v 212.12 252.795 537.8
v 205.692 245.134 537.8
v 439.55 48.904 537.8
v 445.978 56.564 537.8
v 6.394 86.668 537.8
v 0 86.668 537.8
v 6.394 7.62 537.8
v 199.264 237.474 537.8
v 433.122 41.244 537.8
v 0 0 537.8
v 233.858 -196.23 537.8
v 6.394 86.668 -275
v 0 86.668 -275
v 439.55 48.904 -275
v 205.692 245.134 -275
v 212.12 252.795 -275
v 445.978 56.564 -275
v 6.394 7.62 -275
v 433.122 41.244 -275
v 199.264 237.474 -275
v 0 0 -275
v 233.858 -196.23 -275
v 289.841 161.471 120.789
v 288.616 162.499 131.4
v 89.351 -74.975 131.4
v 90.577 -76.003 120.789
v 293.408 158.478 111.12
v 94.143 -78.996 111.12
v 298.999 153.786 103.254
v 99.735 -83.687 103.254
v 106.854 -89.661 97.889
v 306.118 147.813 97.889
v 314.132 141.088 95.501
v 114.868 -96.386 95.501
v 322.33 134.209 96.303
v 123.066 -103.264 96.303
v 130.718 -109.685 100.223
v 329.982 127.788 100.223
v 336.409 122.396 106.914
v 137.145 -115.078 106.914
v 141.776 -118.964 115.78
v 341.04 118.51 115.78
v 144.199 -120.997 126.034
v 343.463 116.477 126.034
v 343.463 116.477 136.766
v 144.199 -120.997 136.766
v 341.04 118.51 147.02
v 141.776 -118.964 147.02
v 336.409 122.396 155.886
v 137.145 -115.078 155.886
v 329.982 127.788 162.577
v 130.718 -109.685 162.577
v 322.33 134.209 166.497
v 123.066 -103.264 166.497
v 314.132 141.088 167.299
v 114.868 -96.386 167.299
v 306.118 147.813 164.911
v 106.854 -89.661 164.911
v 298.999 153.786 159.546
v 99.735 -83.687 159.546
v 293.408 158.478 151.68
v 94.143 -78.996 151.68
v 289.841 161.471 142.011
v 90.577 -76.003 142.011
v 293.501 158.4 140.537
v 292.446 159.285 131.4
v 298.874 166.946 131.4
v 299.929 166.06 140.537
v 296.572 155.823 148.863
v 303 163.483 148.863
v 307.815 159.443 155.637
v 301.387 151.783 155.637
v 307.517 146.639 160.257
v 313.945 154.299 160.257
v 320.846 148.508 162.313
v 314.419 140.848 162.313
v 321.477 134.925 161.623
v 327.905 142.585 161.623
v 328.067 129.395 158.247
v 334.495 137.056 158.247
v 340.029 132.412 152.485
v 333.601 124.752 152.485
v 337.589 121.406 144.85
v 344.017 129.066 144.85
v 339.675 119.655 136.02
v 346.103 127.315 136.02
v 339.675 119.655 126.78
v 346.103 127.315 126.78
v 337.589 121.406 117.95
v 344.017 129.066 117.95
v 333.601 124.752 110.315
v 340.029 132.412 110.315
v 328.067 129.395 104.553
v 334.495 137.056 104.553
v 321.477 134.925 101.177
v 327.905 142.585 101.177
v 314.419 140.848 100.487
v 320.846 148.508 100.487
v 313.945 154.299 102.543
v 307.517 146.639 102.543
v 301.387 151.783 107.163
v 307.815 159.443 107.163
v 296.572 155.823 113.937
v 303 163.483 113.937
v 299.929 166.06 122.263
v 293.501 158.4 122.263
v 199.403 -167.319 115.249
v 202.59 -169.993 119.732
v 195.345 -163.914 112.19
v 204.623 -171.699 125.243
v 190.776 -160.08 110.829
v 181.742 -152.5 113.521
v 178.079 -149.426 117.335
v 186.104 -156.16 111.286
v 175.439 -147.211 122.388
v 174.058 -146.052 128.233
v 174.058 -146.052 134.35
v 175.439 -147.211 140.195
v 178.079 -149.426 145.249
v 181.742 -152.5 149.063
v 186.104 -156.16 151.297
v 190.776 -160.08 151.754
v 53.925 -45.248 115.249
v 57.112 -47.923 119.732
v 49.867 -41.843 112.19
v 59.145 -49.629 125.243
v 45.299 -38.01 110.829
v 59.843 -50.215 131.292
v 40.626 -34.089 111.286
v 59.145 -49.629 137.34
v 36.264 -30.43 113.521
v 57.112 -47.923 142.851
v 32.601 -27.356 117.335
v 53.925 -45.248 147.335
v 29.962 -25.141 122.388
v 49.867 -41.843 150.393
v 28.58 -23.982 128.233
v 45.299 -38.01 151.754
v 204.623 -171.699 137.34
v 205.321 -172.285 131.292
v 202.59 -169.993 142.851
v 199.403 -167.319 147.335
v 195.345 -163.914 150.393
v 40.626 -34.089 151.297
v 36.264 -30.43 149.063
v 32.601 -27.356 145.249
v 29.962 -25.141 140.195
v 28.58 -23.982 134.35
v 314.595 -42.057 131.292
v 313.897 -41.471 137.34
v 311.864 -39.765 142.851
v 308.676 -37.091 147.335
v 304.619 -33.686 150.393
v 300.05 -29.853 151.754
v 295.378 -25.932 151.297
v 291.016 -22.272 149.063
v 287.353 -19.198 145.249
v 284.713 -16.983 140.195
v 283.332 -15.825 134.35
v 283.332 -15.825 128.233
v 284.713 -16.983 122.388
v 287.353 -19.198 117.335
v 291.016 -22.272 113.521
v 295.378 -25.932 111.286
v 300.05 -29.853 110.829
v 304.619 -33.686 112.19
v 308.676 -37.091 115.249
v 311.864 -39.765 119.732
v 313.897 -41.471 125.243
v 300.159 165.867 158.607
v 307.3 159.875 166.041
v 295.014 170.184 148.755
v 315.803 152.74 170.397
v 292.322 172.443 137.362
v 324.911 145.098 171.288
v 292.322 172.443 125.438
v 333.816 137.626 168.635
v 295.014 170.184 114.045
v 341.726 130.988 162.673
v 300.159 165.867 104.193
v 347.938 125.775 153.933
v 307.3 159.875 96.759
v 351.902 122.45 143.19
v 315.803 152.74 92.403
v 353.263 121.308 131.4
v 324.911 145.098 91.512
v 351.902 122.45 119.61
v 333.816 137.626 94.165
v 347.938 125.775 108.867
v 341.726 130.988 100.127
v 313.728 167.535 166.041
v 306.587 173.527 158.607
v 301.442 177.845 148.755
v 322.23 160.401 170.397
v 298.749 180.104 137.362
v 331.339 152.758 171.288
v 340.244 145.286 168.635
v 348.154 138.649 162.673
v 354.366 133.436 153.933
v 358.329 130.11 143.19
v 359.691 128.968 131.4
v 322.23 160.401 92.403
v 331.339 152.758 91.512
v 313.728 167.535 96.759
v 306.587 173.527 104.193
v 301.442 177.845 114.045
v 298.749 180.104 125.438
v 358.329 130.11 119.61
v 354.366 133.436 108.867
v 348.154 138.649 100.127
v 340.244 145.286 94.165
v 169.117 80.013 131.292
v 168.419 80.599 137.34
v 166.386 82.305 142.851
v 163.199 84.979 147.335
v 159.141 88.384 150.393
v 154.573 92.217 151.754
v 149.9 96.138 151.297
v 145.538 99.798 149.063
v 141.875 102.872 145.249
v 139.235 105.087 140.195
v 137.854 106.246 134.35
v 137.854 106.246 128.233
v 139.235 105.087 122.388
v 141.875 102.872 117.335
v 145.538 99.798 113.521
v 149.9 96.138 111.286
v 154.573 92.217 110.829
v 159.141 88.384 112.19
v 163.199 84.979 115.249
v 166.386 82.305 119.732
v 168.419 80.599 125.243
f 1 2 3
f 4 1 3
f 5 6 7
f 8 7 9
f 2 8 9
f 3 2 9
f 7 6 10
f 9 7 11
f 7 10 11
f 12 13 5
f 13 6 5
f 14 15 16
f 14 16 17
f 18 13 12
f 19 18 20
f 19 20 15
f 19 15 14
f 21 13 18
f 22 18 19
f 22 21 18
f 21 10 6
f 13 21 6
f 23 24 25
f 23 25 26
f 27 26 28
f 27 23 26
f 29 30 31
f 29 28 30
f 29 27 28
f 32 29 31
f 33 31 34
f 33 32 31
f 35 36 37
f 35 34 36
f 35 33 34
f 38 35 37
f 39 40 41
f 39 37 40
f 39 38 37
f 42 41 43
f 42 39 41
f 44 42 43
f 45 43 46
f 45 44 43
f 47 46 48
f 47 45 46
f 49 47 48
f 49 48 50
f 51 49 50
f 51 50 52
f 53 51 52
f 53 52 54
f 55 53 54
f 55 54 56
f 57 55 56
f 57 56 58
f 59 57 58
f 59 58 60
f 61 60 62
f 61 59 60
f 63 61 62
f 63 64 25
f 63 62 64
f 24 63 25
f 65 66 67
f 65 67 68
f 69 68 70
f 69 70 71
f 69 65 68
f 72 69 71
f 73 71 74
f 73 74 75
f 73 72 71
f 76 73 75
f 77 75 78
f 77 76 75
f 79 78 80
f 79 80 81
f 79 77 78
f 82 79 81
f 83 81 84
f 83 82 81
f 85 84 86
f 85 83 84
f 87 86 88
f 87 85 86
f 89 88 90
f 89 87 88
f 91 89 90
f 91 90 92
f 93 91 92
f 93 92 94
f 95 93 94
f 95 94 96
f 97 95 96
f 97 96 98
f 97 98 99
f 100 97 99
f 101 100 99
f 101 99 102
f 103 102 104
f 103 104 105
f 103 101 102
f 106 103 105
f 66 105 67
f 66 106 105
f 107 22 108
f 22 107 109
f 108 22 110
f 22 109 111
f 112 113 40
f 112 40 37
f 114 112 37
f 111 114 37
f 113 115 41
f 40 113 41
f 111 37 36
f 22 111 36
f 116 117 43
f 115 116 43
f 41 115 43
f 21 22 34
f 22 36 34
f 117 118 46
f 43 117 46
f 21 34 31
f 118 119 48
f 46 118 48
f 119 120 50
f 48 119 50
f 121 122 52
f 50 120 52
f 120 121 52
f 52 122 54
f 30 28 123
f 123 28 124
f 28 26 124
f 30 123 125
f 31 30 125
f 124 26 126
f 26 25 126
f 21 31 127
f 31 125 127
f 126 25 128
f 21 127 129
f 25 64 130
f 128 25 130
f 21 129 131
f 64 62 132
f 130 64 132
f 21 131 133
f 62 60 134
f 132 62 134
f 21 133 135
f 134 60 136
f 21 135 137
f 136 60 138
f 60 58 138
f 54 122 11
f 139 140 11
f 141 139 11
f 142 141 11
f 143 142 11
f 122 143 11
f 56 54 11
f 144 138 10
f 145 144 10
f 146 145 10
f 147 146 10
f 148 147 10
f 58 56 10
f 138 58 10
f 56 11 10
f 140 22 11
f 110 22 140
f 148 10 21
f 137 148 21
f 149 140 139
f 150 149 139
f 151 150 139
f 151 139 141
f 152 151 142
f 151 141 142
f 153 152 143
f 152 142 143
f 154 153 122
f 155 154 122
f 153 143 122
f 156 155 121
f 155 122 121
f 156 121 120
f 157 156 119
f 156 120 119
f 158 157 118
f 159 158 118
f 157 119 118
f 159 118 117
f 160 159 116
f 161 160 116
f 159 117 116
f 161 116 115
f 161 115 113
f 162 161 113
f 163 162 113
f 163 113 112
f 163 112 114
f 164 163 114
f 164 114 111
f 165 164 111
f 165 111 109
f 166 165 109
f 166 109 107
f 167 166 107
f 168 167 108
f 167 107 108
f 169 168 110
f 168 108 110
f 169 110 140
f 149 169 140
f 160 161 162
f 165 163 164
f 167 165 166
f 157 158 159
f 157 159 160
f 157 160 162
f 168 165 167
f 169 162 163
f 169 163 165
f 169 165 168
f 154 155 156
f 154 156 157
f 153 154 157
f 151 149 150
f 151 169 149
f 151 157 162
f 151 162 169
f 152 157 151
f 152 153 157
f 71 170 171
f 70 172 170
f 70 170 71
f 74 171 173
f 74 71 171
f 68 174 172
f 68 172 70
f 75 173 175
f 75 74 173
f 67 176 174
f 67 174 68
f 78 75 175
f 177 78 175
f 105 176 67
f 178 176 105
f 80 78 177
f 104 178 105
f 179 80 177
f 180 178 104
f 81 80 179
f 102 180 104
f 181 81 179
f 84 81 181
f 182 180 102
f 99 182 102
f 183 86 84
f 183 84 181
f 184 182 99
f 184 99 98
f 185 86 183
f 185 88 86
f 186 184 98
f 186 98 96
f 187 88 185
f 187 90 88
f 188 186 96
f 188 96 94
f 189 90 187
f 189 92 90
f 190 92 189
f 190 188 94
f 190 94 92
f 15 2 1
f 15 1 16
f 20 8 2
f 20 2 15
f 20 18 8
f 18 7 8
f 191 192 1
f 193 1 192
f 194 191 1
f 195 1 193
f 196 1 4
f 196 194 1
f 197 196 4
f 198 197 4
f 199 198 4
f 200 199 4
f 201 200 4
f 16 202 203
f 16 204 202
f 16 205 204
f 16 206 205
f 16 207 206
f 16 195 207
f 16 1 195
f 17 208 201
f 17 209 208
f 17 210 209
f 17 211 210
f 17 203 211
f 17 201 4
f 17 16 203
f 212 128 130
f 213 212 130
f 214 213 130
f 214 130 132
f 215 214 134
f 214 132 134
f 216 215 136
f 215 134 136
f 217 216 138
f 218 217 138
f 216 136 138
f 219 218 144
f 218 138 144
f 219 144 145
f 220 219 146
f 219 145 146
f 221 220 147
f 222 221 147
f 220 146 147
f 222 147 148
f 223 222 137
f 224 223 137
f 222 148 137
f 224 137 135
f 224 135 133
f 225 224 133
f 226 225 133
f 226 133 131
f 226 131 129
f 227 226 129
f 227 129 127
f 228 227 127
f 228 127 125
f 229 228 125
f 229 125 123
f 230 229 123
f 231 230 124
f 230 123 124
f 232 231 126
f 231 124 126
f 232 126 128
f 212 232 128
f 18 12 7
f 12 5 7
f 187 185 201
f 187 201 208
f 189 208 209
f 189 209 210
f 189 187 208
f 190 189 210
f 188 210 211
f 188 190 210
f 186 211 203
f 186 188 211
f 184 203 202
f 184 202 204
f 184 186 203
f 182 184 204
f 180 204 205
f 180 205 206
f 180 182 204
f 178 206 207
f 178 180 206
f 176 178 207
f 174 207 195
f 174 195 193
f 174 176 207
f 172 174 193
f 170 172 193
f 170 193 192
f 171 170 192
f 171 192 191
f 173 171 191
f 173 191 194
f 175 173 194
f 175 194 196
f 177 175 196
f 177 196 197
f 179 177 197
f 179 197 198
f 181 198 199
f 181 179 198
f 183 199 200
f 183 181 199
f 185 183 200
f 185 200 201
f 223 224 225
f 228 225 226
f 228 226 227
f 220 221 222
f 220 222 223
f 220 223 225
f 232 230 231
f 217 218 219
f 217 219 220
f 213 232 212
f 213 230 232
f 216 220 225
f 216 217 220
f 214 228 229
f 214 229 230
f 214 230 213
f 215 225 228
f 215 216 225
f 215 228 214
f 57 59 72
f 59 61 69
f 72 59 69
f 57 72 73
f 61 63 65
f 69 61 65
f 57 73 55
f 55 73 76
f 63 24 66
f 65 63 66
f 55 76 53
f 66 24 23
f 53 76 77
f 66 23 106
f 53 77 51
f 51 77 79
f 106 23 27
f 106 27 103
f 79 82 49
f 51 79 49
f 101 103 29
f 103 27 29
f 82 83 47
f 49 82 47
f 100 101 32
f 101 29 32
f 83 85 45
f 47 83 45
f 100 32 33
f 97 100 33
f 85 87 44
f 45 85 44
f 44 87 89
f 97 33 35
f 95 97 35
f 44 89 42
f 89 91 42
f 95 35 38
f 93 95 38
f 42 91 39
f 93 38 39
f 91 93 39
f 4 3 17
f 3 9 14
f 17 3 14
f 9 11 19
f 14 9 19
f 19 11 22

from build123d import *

# Parameters (mm, degrees)
BOSS_EXTRUDE1_DEPTH     = 262.8
CUT_EXTRUDE3_DEPTH      = 560.510929996
CUT_EXTRUDE3_DEPTH_BACK = 560.510929996
SKETCH6_R               = 36
BOSS_EXTRUDE4_DEPTH     = 275
BOSS_EXTRUDE5_DEPTH     = 275
SKETCH11_W              = 305.28
SKETCH11_H              = 812.8
SKETCH11_R              = 31
BOSS_EXTRUDE6_DEPTH     = 10
SKETCH12_W              = 305.28
SKETCH12_H              = 812.8
SKETCH12_R              = 40
BOSS_EXTRUDE7_DEPTH     = 10
SKETCH13_R              = 20.52
CUT_EXTRUDE4_DEPTH      = 170


with BuildPart() as part:
    # Sketch1 → Boss-Extrude1 (new body)
    with BuildSketch(Plane.XY):
        Polygon((0, 0), (0, 86.668071476), (6.393546256, 86.668071476), (6.393546256, 7.619531721), (199.264159003, 237.473777367), (433.122206598, 41.243575882), (233.858047595, -196.230201485), align=None)
    extrude(amount=BOSS_EXTRUDE1_DEPTH)

    # Sketch6 → Cut-Extrude3 (cut, two sides: drawn at the far end of the back side and taken through both)
    with BuildSketch(Plane(origin=(0, 0, 0), x_dir=(-0.7660444431189771, 0.6427876096865406, 0), z_dir=(-0.6427876096865405, -0.766044443118977, 0)).offset(-CUT_EXTRUDE3_DEPTH_BACK)):
        with Locations((-152.64, -131.4)):
            Circle(SKETCH6_R)
    extrude(amount=CUT_EXTRUDE3_DEPTH + CUT_EXTRUDE3_DEPTH_BACK, mode=Mode.SUBTRACT)

    # Sketch7 → Boss-Extrude4 (add)
    with BuildSketch(Plane.XY.offset(262.8)):
        Polygon((233.858047595, -196.230201485), (0, 0), (0, 86.668071476), (6.393546256, 86.668071476), (6.393546256, 7.619531721), (199.264159003, 237.473777367), (433.122206598, 41.243575882), align=None)
    extrude(amount=BOSS_EXTRUDE4_DEPTH)

    # Sketch8 → Boss-Extrude5 (add)
    with BuildSketch(Plane(origin=(0, 0, 0), x_dir=(-1, 0, 0), z_dir=(0, 0, -1))):
        Polygon((0, 0), (0, 86.668071476), (-6.393546256, 86.668071476), (-6.393546256, 7.619531721), (-199.264159003, 237.473777367), (-433.122206598, 41.243575882), (-233.858047595, -196.230201485), align=None)
    extrude(amount=BOSS_EXTRUDE5_DEPTH)

    # Sketch11 → Boss-Extrude6 (add)
    with BuildSketch(Plane(origin=(199.264159003, 237.473777367, 0), x_dir=(0.7660444431189771, -0.6427876096865404, 0), z_dir=(0.6427876096865404, 0.7660444431189771, 0))):
        with Locations((152.64, -131.4)):
            Rectangle(SKETCH11_W, SKETCH11_H)
        with Locations(Location((152.64, -131.4, 0), (0, 0, 180))):
            Circle(SKETCH11_R, mode=Mode.SUBTRACT)
    extrude(amount=BOSS_EXTRUDE6_DEPTH)

    # Sketch12 → Boss-Extrude7 (add)
    with BuildSketch(Plane(origin=(205.6920351, 245.134221798, 0), x_dir=(0.7660444431189771, -0.6427876096865406, 0), z_dir=(0.6427876096865405, 0.766044443118977, 0))):
        with Locations((152.64, -131.4)):
            Rectangle(SKETCH12_W, SKETCH12_H)
        with Locations((152.64, -131.4)):
            Circle(SKETCH12_R, mode=Mode.SUBTRACT)
    extrude(amount=BOSS_EXTRUDE7_DEPTH)

    # Sketch13 → Cut-Extrude4 (cut)
    with BuildSketch(Plane(origin=(0, 0, 0), x_dir=(-0.7660444431189771, 0.6427876096865406, 0), z_dir=(-0.6427876096865405, -0.766044443118977, 0))):
        with Locations(Location((-57.599898279, -131.291749379, 0), (0, 0, 180))):
            Circle(SKETCH13_R)
        with Locations(Location((-247.507544032, -131.291749379, 0), (0, 0, 180))):
            Circle(SKETCH13_R)
    extrude(amount=-CUT_EXTRUDE4_DEPTH, mode=Mode.SUBTRACT)


solid = part.part
